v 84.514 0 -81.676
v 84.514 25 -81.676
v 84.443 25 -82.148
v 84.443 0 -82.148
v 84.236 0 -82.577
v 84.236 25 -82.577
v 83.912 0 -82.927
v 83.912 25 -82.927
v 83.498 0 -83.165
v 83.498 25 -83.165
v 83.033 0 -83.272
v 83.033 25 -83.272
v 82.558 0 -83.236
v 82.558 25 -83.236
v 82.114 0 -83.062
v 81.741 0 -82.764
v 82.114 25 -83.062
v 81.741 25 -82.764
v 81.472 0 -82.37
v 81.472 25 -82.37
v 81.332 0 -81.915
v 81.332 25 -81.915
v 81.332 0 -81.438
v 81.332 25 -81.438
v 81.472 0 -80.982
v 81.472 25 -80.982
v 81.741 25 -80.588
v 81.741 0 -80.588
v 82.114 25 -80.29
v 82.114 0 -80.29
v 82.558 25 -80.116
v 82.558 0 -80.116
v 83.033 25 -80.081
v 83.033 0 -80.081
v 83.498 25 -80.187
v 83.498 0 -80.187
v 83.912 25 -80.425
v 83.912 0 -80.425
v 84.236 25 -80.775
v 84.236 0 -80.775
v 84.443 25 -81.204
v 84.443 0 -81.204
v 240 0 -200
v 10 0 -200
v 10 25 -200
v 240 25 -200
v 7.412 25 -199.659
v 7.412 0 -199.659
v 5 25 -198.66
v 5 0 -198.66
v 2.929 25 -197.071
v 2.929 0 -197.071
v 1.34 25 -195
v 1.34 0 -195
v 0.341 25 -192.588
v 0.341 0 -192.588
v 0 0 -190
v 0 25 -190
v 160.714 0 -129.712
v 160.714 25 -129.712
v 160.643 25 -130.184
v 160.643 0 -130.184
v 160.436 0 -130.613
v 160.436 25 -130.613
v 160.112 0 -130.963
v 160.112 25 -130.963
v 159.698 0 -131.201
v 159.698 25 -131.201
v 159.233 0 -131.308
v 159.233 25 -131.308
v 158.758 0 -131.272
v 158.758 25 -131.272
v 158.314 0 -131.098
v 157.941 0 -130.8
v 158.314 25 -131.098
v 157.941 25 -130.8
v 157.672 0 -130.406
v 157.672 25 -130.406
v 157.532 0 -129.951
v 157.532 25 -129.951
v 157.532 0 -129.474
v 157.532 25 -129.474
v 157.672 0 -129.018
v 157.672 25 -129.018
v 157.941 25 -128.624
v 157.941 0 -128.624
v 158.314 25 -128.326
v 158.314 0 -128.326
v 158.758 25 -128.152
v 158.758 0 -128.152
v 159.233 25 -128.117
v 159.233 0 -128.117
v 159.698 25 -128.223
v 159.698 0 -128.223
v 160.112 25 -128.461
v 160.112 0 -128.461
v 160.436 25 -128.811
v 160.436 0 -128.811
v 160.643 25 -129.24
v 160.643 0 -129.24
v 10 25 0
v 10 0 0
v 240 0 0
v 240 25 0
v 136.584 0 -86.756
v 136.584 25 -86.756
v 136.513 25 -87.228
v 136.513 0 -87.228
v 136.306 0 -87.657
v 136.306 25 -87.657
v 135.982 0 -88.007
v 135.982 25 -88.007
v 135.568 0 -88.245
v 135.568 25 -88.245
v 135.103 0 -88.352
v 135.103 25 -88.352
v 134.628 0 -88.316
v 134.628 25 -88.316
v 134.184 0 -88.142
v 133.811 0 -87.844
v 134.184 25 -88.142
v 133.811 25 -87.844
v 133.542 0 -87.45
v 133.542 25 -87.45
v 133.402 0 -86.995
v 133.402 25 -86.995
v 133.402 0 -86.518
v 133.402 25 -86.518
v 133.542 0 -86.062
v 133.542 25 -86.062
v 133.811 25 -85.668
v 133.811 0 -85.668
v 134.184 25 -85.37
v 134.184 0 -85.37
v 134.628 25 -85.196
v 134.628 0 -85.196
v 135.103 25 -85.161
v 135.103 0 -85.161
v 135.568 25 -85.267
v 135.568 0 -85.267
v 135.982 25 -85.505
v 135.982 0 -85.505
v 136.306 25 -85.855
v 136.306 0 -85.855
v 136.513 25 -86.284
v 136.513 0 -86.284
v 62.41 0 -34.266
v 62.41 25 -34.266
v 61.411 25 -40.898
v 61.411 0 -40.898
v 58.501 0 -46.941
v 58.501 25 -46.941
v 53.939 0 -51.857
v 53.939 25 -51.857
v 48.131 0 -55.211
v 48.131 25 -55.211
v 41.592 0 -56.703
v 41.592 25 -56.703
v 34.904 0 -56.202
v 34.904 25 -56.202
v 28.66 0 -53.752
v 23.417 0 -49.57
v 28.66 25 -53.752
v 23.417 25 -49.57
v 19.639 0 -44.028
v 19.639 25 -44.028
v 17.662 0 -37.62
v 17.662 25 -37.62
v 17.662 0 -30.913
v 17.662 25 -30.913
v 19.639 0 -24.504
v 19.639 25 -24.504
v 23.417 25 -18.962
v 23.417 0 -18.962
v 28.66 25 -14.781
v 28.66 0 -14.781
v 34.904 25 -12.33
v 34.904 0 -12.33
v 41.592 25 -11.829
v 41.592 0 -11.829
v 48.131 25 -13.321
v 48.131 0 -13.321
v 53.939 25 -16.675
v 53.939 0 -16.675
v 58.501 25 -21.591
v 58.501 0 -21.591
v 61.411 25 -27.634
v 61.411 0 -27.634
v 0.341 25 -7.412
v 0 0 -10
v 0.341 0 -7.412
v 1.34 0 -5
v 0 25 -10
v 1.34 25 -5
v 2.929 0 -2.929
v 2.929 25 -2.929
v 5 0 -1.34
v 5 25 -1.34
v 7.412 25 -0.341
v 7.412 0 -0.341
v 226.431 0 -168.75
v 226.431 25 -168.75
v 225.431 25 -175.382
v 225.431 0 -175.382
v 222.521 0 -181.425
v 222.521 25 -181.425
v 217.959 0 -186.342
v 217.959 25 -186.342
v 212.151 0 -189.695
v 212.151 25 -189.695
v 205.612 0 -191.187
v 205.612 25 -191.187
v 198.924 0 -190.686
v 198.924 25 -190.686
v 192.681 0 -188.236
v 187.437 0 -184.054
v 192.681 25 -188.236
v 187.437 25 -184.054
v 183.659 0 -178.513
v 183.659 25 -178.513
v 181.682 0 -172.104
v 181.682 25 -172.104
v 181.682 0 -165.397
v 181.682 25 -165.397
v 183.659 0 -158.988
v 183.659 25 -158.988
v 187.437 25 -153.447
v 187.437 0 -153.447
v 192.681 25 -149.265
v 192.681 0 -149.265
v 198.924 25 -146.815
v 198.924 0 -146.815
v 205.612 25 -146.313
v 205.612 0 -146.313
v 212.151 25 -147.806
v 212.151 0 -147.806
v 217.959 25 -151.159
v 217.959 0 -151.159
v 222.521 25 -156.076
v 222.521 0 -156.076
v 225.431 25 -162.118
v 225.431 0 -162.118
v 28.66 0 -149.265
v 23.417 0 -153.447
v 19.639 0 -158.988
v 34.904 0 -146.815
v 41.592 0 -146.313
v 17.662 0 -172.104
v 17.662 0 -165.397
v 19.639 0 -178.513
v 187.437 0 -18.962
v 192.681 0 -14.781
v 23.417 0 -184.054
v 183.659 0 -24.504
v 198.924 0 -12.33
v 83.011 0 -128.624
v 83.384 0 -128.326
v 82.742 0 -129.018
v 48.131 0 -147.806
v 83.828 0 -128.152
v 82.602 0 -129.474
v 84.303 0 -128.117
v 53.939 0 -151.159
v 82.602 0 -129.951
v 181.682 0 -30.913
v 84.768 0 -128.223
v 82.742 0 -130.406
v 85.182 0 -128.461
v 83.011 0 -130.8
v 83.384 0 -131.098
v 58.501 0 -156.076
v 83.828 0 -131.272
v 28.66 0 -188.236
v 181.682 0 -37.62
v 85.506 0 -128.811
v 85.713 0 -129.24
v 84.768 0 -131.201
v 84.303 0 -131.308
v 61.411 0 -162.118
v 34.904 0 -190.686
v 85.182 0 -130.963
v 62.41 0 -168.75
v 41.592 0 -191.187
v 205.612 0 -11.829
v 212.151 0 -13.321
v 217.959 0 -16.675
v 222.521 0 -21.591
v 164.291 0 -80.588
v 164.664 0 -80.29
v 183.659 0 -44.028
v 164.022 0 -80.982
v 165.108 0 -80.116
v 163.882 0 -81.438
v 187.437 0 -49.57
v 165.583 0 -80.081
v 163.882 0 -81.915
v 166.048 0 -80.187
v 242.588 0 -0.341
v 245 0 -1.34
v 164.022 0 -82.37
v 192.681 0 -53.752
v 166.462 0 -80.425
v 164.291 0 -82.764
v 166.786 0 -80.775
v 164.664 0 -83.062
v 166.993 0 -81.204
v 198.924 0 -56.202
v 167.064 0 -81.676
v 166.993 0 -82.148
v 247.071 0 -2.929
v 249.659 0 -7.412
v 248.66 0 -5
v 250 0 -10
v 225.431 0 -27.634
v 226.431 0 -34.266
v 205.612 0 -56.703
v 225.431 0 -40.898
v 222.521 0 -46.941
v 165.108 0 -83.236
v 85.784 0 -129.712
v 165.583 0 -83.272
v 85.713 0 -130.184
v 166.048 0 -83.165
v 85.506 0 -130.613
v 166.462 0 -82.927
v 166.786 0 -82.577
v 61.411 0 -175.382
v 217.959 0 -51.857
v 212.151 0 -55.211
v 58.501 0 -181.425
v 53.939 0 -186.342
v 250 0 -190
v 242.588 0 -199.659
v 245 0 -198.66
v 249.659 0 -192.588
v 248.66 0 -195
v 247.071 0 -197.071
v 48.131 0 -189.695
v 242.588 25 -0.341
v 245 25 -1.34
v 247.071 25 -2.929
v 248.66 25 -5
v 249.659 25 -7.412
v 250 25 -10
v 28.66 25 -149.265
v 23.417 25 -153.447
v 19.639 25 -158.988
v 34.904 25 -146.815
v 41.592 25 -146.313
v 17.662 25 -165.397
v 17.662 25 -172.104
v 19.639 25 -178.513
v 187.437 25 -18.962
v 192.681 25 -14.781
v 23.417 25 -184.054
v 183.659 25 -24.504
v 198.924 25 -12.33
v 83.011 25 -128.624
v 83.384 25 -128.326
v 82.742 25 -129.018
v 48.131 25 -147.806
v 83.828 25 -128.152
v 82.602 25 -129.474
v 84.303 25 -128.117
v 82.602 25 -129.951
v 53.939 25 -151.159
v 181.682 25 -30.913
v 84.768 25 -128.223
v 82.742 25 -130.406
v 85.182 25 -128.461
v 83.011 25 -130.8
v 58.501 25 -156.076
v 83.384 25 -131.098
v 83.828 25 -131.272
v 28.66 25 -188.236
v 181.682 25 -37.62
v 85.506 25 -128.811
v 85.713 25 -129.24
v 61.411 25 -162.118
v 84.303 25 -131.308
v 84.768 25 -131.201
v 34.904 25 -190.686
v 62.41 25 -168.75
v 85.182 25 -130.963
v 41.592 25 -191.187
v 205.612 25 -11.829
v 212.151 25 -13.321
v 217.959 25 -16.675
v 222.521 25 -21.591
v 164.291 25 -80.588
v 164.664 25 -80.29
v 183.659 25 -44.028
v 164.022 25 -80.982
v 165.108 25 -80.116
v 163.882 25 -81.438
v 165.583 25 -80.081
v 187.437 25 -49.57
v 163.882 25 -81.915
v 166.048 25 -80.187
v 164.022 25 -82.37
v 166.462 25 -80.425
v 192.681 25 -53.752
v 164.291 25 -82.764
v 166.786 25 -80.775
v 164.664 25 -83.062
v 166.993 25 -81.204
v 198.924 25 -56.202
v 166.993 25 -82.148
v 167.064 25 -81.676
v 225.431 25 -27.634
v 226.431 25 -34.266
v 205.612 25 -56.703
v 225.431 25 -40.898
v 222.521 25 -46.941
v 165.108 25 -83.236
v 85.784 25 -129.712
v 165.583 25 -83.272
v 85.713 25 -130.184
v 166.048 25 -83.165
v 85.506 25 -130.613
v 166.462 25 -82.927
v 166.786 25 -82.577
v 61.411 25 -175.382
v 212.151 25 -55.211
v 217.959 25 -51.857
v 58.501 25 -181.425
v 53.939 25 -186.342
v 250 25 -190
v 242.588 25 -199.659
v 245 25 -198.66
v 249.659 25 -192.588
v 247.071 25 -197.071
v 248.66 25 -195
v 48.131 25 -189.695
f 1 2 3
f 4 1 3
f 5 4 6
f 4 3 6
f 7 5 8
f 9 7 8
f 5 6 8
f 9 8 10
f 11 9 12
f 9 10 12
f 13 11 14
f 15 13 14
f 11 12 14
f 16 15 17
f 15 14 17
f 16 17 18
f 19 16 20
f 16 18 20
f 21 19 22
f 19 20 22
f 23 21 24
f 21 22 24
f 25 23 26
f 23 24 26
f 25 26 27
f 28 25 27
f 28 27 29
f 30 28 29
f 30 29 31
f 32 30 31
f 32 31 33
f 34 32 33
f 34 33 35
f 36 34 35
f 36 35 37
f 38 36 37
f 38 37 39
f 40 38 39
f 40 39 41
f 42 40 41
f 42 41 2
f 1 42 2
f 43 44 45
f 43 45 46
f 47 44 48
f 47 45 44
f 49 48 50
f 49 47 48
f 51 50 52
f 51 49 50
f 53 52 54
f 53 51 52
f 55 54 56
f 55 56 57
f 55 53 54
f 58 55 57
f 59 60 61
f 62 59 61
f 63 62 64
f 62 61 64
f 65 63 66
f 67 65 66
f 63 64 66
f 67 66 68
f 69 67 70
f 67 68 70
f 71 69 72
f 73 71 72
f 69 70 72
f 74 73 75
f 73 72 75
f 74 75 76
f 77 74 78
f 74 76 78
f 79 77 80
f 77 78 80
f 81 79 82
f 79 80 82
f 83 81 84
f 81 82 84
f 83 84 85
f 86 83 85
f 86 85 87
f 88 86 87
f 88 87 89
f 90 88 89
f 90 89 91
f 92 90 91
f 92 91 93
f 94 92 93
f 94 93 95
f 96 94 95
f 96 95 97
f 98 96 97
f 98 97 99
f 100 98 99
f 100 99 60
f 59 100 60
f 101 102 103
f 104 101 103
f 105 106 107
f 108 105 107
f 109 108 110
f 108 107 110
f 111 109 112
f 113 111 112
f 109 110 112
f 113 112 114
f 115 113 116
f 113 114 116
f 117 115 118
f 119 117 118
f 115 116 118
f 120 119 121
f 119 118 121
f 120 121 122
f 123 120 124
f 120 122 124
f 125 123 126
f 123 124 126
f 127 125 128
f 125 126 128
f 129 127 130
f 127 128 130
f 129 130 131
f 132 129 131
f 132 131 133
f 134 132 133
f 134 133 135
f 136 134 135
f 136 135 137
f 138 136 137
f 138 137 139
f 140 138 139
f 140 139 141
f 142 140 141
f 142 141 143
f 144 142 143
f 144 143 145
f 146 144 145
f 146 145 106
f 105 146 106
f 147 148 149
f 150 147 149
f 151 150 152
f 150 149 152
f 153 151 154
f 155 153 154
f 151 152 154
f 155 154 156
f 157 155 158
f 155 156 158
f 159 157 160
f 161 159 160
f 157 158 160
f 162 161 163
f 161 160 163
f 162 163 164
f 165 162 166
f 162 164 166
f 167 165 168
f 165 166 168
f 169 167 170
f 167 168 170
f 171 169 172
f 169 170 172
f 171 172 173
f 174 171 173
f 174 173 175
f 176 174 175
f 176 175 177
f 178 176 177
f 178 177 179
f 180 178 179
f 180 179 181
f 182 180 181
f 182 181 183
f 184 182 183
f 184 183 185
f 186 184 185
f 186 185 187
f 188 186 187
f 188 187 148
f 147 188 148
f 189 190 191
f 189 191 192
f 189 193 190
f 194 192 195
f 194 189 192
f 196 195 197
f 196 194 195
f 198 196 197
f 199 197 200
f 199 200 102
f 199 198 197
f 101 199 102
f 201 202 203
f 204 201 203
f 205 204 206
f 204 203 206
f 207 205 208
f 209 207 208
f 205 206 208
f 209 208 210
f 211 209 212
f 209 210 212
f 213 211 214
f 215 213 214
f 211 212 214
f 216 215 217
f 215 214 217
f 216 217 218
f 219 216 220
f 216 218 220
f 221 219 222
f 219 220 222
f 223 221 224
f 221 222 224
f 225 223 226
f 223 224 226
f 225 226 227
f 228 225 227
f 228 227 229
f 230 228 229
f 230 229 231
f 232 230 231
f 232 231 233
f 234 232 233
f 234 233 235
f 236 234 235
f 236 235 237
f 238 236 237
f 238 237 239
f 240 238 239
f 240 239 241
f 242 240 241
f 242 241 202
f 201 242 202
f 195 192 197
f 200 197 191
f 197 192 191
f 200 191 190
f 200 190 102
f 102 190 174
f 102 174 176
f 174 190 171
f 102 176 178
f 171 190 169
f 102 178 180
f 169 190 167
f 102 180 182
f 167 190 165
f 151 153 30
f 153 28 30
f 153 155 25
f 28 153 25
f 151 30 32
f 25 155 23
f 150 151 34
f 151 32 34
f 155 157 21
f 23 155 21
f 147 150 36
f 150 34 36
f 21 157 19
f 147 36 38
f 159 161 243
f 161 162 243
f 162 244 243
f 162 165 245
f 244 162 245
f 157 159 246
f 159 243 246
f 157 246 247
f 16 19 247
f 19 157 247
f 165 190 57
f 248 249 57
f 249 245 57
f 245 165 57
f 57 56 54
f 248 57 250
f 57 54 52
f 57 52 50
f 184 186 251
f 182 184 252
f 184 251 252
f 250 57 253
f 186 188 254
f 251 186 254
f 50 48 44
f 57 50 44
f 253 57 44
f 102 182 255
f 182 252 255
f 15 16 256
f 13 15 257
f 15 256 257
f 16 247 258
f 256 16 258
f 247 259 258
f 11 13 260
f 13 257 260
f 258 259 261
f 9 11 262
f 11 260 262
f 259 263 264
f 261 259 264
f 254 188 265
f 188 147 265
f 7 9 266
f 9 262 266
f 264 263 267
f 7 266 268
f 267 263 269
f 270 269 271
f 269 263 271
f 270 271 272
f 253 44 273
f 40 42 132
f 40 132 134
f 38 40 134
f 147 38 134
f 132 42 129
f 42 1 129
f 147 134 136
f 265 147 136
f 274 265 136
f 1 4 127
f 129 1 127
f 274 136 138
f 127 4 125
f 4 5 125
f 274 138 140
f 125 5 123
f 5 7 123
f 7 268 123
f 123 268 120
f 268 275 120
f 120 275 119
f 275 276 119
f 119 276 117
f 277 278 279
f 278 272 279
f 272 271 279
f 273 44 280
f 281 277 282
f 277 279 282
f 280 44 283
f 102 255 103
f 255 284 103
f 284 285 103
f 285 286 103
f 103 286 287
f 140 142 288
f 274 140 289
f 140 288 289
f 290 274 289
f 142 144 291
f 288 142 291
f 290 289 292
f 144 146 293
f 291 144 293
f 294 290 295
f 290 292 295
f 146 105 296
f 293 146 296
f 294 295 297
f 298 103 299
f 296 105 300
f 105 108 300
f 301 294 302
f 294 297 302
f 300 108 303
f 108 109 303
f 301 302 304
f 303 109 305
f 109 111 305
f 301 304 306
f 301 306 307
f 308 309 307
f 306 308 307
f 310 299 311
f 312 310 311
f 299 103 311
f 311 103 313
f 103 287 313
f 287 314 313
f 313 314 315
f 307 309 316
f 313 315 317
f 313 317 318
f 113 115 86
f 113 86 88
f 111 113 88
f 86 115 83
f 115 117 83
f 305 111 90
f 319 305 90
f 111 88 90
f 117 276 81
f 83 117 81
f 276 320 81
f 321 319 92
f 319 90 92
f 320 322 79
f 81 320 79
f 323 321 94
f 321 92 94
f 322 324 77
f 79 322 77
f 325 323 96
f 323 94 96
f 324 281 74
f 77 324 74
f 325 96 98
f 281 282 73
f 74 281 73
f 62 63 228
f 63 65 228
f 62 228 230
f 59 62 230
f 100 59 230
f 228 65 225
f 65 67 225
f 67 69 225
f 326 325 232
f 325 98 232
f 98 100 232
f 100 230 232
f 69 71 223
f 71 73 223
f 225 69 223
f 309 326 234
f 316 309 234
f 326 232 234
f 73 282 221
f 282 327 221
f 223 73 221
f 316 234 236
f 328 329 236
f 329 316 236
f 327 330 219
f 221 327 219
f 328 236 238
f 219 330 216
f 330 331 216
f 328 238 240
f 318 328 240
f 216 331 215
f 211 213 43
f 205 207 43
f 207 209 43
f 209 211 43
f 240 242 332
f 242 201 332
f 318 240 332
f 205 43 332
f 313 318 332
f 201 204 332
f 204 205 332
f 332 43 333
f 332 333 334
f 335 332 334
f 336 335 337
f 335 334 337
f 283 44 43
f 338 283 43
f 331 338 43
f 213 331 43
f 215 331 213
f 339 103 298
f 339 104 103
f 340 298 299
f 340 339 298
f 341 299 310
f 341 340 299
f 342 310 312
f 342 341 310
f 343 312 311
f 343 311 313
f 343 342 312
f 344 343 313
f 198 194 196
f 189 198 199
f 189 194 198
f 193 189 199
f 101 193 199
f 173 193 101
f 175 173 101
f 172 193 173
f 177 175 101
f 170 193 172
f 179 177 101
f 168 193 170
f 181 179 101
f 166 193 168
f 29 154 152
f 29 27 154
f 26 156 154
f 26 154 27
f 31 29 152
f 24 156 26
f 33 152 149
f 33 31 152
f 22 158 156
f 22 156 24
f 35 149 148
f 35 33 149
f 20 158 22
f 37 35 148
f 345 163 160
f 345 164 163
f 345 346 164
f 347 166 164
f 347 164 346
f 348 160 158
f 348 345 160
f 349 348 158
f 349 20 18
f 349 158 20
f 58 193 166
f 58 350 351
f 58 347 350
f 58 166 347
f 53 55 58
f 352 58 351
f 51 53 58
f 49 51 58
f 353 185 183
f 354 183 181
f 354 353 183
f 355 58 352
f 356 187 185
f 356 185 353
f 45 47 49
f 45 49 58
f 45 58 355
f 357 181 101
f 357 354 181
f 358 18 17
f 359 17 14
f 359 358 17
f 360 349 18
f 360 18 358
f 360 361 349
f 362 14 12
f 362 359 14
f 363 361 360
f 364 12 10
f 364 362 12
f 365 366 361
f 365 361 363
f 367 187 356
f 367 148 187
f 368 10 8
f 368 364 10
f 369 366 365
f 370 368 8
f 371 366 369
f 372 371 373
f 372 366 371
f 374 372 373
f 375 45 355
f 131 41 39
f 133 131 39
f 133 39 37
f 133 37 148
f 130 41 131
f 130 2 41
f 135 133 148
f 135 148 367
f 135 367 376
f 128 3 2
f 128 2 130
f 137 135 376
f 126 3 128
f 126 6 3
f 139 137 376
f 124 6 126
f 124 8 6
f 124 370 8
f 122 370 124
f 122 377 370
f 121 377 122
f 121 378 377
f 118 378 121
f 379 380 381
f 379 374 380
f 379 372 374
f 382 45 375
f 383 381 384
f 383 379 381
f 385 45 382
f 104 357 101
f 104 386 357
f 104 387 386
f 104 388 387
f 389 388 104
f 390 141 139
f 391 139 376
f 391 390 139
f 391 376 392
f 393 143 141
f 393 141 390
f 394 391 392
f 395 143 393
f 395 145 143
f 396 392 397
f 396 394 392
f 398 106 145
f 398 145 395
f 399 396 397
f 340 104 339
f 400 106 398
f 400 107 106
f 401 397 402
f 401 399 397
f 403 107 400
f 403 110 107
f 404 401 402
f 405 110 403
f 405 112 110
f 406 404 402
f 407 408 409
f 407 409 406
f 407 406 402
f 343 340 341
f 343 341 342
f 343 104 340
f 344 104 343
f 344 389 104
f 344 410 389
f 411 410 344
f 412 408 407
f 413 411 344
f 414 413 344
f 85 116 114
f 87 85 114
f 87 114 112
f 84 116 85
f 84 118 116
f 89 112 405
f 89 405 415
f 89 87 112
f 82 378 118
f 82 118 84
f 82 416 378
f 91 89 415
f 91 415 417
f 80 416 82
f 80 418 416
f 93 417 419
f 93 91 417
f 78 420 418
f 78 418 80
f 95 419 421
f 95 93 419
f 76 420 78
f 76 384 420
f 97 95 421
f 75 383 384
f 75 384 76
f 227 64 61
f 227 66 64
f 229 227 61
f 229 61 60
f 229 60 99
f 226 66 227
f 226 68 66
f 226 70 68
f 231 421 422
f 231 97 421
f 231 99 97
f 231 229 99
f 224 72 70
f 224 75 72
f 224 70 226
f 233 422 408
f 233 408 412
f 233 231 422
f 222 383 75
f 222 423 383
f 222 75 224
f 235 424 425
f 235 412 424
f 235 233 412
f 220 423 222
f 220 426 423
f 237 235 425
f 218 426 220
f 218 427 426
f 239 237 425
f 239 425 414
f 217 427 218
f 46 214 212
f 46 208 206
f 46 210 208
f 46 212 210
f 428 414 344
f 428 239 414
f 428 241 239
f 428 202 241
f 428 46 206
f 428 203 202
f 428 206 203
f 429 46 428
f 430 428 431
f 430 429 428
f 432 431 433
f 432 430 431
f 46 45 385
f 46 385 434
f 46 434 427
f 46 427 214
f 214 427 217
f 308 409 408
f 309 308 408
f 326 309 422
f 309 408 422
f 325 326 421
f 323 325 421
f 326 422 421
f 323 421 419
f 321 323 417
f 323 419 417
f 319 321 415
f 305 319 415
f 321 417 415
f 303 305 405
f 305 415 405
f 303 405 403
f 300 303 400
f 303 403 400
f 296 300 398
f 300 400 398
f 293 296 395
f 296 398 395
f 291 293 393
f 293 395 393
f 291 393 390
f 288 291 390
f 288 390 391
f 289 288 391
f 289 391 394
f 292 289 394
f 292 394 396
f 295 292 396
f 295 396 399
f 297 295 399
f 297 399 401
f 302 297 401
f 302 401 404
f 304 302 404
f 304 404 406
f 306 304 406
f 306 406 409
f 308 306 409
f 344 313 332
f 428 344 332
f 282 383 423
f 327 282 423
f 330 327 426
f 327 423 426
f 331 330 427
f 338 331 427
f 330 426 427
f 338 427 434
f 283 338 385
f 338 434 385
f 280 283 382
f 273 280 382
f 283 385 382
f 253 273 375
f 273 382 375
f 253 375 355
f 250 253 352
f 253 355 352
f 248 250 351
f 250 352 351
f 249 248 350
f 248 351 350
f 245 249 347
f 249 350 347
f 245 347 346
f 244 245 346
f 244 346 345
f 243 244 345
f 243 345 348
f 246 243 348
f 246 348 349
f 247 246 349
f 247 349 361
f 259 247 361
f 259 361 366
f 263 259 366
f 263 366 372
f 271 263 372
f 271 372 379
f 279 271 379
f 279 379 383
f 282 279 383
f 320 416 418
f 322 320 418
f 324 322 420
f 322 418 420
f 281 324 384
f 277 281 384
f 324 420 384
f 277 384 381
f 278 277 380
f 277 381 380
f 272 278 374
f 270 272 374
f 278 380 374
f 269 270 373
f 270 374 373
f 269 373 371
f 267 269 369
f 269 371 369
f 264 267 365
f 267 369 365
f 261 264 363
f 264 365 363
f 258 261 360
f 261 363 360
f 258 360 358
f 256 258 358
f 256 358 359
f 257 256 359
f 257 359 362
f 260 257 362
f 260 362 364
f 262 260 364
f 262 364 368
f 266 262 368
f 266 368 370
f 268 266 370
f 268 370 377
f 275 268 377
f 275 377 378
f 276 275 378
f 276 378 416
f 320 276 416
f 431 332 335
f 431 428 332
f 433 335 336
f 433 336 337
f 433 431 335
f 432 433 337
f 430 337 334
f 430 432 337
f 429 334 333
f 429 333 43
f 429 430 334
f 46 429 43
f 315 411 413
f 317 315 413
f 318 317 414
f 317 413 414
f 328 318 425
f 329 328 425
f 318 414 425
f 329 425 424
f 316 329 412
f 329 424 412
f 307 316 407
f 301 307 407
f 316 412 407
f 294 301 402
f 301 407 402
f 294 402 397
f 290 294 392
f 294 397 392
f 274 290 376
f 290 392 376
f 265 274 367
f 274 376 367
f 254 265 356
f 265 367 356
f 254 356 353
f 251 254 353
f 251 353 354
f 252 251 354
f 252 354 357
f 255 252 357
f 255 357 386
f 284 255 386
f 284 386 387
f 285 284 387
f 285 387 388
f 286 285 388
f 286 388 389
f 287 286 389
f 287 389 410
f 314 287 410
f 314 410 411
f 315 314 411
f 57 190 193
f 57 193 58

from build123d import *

# Parameters (mm, degrees)
SKETCH2_W           = 250
SKETCH2_H           = 200
BOSS_EXTRUDE1_DEPTH = 25
FILLET1_R           = 10
FILLET2_R           = 10
FILLET3_R           = 10
FILLET4_R           = 10
SKETCH3_R           = 1.6
CUT_EXTRUDE1_DEPTH  = 26
SKETCH4_R           = 22.5
CUT_EXTRUDE2_DEPTH  = 26


with BuildPart() as part:
    # Sketch2 → Boss-Extrude1 (new body)
    with BuildSketch(Plane(origin=(0, 0, 0), x_dir=(1, 0, 0), z_dir=(0, 1, 0))):
        with Locations((125, 100)):
            Rectangle(SKETCH2_W, SKETCH2_H)
    extrude(amount=BOSS_EXTRUDE1_DEPTH)

    # Fillet1
    fillet1_edges = [part.edges().sort_by_distance(p)[0] for p in [
        (0, 12.5, 0),
    ]]
    fillet(fillet1_edges, radius=FILLET1_R)

    # Fillet2
    fillet2_edges = [part.edges().sort_by_distance(p)[0] for p in [
        (250, 12.5, 0),
    ]]
    fillet(fillet2_edges, radius=FILLET2_R)

    # Fillet3
    fillet3_edges = [part.edges().sort_by_distance(p)[0] for p in [
        (250, 12.5, -200),
    ]]
    fillet(fillet3_edges, radius=FILLET3_R)

    # Fillet4
    fillet4_edges = [part.edges().sort_by_distance(p)[0] for p in [
        (0, 12.5, -200),
    ]]
    fillet(fillet4_edges, radius=FILLET4_R)

    # Sketch3 → Cut-Extrude1 (cut, through all)
    with BuildSketch(Plane(origin=(0, 25, 0), x_dir=(1, 0, 0), z_dir=(0, 1, 0))):
        with Locations((84.183925072, 129.712061316)):
            Circle(SKETCH3_R)
        with Locations((82.913925072, 81.676079735)):
            Circle(SKETCH3_R)
        with Locations((165.463925072, 81.676079735)):
            Circle(SKETCH3_R)
        with Locations((159.113925072, 129.712061316)):
            Circle(SKETCH3_R)
        with Locations((134.983925072, 86.756079735)):
            Circle(SKETCH3_R)
    extrude(amount=-CUT_EXTRUDE1_DEPTH, mode=Mode.SUBTRACT)

    # Sketch4 → Cut-Extrude2 (cut, through all)
    with BuildSketch(Plane(origin=(0, 25, 0), x_dir=(1, 0, 0), z_dir=(0, 1, 0))):
        with Locations((203.930975459, 168.75038786)):
            Circle(SKETCH4_R)
        with Locations((203.930975459, 34.26608254)):
            Circle(SKETCH4_R)
        with Locations((39.910397475, 34.26608254)):
            Circle(SKETCH4_R)
        with Locations((39.910397475, 168.75038786)):
            Circle(SKETCH4_R)
    extrude(amount=-CUT_EXTRUDE2_DEPTH, mode=Mode.SUBTRACT)


solid = part.part
